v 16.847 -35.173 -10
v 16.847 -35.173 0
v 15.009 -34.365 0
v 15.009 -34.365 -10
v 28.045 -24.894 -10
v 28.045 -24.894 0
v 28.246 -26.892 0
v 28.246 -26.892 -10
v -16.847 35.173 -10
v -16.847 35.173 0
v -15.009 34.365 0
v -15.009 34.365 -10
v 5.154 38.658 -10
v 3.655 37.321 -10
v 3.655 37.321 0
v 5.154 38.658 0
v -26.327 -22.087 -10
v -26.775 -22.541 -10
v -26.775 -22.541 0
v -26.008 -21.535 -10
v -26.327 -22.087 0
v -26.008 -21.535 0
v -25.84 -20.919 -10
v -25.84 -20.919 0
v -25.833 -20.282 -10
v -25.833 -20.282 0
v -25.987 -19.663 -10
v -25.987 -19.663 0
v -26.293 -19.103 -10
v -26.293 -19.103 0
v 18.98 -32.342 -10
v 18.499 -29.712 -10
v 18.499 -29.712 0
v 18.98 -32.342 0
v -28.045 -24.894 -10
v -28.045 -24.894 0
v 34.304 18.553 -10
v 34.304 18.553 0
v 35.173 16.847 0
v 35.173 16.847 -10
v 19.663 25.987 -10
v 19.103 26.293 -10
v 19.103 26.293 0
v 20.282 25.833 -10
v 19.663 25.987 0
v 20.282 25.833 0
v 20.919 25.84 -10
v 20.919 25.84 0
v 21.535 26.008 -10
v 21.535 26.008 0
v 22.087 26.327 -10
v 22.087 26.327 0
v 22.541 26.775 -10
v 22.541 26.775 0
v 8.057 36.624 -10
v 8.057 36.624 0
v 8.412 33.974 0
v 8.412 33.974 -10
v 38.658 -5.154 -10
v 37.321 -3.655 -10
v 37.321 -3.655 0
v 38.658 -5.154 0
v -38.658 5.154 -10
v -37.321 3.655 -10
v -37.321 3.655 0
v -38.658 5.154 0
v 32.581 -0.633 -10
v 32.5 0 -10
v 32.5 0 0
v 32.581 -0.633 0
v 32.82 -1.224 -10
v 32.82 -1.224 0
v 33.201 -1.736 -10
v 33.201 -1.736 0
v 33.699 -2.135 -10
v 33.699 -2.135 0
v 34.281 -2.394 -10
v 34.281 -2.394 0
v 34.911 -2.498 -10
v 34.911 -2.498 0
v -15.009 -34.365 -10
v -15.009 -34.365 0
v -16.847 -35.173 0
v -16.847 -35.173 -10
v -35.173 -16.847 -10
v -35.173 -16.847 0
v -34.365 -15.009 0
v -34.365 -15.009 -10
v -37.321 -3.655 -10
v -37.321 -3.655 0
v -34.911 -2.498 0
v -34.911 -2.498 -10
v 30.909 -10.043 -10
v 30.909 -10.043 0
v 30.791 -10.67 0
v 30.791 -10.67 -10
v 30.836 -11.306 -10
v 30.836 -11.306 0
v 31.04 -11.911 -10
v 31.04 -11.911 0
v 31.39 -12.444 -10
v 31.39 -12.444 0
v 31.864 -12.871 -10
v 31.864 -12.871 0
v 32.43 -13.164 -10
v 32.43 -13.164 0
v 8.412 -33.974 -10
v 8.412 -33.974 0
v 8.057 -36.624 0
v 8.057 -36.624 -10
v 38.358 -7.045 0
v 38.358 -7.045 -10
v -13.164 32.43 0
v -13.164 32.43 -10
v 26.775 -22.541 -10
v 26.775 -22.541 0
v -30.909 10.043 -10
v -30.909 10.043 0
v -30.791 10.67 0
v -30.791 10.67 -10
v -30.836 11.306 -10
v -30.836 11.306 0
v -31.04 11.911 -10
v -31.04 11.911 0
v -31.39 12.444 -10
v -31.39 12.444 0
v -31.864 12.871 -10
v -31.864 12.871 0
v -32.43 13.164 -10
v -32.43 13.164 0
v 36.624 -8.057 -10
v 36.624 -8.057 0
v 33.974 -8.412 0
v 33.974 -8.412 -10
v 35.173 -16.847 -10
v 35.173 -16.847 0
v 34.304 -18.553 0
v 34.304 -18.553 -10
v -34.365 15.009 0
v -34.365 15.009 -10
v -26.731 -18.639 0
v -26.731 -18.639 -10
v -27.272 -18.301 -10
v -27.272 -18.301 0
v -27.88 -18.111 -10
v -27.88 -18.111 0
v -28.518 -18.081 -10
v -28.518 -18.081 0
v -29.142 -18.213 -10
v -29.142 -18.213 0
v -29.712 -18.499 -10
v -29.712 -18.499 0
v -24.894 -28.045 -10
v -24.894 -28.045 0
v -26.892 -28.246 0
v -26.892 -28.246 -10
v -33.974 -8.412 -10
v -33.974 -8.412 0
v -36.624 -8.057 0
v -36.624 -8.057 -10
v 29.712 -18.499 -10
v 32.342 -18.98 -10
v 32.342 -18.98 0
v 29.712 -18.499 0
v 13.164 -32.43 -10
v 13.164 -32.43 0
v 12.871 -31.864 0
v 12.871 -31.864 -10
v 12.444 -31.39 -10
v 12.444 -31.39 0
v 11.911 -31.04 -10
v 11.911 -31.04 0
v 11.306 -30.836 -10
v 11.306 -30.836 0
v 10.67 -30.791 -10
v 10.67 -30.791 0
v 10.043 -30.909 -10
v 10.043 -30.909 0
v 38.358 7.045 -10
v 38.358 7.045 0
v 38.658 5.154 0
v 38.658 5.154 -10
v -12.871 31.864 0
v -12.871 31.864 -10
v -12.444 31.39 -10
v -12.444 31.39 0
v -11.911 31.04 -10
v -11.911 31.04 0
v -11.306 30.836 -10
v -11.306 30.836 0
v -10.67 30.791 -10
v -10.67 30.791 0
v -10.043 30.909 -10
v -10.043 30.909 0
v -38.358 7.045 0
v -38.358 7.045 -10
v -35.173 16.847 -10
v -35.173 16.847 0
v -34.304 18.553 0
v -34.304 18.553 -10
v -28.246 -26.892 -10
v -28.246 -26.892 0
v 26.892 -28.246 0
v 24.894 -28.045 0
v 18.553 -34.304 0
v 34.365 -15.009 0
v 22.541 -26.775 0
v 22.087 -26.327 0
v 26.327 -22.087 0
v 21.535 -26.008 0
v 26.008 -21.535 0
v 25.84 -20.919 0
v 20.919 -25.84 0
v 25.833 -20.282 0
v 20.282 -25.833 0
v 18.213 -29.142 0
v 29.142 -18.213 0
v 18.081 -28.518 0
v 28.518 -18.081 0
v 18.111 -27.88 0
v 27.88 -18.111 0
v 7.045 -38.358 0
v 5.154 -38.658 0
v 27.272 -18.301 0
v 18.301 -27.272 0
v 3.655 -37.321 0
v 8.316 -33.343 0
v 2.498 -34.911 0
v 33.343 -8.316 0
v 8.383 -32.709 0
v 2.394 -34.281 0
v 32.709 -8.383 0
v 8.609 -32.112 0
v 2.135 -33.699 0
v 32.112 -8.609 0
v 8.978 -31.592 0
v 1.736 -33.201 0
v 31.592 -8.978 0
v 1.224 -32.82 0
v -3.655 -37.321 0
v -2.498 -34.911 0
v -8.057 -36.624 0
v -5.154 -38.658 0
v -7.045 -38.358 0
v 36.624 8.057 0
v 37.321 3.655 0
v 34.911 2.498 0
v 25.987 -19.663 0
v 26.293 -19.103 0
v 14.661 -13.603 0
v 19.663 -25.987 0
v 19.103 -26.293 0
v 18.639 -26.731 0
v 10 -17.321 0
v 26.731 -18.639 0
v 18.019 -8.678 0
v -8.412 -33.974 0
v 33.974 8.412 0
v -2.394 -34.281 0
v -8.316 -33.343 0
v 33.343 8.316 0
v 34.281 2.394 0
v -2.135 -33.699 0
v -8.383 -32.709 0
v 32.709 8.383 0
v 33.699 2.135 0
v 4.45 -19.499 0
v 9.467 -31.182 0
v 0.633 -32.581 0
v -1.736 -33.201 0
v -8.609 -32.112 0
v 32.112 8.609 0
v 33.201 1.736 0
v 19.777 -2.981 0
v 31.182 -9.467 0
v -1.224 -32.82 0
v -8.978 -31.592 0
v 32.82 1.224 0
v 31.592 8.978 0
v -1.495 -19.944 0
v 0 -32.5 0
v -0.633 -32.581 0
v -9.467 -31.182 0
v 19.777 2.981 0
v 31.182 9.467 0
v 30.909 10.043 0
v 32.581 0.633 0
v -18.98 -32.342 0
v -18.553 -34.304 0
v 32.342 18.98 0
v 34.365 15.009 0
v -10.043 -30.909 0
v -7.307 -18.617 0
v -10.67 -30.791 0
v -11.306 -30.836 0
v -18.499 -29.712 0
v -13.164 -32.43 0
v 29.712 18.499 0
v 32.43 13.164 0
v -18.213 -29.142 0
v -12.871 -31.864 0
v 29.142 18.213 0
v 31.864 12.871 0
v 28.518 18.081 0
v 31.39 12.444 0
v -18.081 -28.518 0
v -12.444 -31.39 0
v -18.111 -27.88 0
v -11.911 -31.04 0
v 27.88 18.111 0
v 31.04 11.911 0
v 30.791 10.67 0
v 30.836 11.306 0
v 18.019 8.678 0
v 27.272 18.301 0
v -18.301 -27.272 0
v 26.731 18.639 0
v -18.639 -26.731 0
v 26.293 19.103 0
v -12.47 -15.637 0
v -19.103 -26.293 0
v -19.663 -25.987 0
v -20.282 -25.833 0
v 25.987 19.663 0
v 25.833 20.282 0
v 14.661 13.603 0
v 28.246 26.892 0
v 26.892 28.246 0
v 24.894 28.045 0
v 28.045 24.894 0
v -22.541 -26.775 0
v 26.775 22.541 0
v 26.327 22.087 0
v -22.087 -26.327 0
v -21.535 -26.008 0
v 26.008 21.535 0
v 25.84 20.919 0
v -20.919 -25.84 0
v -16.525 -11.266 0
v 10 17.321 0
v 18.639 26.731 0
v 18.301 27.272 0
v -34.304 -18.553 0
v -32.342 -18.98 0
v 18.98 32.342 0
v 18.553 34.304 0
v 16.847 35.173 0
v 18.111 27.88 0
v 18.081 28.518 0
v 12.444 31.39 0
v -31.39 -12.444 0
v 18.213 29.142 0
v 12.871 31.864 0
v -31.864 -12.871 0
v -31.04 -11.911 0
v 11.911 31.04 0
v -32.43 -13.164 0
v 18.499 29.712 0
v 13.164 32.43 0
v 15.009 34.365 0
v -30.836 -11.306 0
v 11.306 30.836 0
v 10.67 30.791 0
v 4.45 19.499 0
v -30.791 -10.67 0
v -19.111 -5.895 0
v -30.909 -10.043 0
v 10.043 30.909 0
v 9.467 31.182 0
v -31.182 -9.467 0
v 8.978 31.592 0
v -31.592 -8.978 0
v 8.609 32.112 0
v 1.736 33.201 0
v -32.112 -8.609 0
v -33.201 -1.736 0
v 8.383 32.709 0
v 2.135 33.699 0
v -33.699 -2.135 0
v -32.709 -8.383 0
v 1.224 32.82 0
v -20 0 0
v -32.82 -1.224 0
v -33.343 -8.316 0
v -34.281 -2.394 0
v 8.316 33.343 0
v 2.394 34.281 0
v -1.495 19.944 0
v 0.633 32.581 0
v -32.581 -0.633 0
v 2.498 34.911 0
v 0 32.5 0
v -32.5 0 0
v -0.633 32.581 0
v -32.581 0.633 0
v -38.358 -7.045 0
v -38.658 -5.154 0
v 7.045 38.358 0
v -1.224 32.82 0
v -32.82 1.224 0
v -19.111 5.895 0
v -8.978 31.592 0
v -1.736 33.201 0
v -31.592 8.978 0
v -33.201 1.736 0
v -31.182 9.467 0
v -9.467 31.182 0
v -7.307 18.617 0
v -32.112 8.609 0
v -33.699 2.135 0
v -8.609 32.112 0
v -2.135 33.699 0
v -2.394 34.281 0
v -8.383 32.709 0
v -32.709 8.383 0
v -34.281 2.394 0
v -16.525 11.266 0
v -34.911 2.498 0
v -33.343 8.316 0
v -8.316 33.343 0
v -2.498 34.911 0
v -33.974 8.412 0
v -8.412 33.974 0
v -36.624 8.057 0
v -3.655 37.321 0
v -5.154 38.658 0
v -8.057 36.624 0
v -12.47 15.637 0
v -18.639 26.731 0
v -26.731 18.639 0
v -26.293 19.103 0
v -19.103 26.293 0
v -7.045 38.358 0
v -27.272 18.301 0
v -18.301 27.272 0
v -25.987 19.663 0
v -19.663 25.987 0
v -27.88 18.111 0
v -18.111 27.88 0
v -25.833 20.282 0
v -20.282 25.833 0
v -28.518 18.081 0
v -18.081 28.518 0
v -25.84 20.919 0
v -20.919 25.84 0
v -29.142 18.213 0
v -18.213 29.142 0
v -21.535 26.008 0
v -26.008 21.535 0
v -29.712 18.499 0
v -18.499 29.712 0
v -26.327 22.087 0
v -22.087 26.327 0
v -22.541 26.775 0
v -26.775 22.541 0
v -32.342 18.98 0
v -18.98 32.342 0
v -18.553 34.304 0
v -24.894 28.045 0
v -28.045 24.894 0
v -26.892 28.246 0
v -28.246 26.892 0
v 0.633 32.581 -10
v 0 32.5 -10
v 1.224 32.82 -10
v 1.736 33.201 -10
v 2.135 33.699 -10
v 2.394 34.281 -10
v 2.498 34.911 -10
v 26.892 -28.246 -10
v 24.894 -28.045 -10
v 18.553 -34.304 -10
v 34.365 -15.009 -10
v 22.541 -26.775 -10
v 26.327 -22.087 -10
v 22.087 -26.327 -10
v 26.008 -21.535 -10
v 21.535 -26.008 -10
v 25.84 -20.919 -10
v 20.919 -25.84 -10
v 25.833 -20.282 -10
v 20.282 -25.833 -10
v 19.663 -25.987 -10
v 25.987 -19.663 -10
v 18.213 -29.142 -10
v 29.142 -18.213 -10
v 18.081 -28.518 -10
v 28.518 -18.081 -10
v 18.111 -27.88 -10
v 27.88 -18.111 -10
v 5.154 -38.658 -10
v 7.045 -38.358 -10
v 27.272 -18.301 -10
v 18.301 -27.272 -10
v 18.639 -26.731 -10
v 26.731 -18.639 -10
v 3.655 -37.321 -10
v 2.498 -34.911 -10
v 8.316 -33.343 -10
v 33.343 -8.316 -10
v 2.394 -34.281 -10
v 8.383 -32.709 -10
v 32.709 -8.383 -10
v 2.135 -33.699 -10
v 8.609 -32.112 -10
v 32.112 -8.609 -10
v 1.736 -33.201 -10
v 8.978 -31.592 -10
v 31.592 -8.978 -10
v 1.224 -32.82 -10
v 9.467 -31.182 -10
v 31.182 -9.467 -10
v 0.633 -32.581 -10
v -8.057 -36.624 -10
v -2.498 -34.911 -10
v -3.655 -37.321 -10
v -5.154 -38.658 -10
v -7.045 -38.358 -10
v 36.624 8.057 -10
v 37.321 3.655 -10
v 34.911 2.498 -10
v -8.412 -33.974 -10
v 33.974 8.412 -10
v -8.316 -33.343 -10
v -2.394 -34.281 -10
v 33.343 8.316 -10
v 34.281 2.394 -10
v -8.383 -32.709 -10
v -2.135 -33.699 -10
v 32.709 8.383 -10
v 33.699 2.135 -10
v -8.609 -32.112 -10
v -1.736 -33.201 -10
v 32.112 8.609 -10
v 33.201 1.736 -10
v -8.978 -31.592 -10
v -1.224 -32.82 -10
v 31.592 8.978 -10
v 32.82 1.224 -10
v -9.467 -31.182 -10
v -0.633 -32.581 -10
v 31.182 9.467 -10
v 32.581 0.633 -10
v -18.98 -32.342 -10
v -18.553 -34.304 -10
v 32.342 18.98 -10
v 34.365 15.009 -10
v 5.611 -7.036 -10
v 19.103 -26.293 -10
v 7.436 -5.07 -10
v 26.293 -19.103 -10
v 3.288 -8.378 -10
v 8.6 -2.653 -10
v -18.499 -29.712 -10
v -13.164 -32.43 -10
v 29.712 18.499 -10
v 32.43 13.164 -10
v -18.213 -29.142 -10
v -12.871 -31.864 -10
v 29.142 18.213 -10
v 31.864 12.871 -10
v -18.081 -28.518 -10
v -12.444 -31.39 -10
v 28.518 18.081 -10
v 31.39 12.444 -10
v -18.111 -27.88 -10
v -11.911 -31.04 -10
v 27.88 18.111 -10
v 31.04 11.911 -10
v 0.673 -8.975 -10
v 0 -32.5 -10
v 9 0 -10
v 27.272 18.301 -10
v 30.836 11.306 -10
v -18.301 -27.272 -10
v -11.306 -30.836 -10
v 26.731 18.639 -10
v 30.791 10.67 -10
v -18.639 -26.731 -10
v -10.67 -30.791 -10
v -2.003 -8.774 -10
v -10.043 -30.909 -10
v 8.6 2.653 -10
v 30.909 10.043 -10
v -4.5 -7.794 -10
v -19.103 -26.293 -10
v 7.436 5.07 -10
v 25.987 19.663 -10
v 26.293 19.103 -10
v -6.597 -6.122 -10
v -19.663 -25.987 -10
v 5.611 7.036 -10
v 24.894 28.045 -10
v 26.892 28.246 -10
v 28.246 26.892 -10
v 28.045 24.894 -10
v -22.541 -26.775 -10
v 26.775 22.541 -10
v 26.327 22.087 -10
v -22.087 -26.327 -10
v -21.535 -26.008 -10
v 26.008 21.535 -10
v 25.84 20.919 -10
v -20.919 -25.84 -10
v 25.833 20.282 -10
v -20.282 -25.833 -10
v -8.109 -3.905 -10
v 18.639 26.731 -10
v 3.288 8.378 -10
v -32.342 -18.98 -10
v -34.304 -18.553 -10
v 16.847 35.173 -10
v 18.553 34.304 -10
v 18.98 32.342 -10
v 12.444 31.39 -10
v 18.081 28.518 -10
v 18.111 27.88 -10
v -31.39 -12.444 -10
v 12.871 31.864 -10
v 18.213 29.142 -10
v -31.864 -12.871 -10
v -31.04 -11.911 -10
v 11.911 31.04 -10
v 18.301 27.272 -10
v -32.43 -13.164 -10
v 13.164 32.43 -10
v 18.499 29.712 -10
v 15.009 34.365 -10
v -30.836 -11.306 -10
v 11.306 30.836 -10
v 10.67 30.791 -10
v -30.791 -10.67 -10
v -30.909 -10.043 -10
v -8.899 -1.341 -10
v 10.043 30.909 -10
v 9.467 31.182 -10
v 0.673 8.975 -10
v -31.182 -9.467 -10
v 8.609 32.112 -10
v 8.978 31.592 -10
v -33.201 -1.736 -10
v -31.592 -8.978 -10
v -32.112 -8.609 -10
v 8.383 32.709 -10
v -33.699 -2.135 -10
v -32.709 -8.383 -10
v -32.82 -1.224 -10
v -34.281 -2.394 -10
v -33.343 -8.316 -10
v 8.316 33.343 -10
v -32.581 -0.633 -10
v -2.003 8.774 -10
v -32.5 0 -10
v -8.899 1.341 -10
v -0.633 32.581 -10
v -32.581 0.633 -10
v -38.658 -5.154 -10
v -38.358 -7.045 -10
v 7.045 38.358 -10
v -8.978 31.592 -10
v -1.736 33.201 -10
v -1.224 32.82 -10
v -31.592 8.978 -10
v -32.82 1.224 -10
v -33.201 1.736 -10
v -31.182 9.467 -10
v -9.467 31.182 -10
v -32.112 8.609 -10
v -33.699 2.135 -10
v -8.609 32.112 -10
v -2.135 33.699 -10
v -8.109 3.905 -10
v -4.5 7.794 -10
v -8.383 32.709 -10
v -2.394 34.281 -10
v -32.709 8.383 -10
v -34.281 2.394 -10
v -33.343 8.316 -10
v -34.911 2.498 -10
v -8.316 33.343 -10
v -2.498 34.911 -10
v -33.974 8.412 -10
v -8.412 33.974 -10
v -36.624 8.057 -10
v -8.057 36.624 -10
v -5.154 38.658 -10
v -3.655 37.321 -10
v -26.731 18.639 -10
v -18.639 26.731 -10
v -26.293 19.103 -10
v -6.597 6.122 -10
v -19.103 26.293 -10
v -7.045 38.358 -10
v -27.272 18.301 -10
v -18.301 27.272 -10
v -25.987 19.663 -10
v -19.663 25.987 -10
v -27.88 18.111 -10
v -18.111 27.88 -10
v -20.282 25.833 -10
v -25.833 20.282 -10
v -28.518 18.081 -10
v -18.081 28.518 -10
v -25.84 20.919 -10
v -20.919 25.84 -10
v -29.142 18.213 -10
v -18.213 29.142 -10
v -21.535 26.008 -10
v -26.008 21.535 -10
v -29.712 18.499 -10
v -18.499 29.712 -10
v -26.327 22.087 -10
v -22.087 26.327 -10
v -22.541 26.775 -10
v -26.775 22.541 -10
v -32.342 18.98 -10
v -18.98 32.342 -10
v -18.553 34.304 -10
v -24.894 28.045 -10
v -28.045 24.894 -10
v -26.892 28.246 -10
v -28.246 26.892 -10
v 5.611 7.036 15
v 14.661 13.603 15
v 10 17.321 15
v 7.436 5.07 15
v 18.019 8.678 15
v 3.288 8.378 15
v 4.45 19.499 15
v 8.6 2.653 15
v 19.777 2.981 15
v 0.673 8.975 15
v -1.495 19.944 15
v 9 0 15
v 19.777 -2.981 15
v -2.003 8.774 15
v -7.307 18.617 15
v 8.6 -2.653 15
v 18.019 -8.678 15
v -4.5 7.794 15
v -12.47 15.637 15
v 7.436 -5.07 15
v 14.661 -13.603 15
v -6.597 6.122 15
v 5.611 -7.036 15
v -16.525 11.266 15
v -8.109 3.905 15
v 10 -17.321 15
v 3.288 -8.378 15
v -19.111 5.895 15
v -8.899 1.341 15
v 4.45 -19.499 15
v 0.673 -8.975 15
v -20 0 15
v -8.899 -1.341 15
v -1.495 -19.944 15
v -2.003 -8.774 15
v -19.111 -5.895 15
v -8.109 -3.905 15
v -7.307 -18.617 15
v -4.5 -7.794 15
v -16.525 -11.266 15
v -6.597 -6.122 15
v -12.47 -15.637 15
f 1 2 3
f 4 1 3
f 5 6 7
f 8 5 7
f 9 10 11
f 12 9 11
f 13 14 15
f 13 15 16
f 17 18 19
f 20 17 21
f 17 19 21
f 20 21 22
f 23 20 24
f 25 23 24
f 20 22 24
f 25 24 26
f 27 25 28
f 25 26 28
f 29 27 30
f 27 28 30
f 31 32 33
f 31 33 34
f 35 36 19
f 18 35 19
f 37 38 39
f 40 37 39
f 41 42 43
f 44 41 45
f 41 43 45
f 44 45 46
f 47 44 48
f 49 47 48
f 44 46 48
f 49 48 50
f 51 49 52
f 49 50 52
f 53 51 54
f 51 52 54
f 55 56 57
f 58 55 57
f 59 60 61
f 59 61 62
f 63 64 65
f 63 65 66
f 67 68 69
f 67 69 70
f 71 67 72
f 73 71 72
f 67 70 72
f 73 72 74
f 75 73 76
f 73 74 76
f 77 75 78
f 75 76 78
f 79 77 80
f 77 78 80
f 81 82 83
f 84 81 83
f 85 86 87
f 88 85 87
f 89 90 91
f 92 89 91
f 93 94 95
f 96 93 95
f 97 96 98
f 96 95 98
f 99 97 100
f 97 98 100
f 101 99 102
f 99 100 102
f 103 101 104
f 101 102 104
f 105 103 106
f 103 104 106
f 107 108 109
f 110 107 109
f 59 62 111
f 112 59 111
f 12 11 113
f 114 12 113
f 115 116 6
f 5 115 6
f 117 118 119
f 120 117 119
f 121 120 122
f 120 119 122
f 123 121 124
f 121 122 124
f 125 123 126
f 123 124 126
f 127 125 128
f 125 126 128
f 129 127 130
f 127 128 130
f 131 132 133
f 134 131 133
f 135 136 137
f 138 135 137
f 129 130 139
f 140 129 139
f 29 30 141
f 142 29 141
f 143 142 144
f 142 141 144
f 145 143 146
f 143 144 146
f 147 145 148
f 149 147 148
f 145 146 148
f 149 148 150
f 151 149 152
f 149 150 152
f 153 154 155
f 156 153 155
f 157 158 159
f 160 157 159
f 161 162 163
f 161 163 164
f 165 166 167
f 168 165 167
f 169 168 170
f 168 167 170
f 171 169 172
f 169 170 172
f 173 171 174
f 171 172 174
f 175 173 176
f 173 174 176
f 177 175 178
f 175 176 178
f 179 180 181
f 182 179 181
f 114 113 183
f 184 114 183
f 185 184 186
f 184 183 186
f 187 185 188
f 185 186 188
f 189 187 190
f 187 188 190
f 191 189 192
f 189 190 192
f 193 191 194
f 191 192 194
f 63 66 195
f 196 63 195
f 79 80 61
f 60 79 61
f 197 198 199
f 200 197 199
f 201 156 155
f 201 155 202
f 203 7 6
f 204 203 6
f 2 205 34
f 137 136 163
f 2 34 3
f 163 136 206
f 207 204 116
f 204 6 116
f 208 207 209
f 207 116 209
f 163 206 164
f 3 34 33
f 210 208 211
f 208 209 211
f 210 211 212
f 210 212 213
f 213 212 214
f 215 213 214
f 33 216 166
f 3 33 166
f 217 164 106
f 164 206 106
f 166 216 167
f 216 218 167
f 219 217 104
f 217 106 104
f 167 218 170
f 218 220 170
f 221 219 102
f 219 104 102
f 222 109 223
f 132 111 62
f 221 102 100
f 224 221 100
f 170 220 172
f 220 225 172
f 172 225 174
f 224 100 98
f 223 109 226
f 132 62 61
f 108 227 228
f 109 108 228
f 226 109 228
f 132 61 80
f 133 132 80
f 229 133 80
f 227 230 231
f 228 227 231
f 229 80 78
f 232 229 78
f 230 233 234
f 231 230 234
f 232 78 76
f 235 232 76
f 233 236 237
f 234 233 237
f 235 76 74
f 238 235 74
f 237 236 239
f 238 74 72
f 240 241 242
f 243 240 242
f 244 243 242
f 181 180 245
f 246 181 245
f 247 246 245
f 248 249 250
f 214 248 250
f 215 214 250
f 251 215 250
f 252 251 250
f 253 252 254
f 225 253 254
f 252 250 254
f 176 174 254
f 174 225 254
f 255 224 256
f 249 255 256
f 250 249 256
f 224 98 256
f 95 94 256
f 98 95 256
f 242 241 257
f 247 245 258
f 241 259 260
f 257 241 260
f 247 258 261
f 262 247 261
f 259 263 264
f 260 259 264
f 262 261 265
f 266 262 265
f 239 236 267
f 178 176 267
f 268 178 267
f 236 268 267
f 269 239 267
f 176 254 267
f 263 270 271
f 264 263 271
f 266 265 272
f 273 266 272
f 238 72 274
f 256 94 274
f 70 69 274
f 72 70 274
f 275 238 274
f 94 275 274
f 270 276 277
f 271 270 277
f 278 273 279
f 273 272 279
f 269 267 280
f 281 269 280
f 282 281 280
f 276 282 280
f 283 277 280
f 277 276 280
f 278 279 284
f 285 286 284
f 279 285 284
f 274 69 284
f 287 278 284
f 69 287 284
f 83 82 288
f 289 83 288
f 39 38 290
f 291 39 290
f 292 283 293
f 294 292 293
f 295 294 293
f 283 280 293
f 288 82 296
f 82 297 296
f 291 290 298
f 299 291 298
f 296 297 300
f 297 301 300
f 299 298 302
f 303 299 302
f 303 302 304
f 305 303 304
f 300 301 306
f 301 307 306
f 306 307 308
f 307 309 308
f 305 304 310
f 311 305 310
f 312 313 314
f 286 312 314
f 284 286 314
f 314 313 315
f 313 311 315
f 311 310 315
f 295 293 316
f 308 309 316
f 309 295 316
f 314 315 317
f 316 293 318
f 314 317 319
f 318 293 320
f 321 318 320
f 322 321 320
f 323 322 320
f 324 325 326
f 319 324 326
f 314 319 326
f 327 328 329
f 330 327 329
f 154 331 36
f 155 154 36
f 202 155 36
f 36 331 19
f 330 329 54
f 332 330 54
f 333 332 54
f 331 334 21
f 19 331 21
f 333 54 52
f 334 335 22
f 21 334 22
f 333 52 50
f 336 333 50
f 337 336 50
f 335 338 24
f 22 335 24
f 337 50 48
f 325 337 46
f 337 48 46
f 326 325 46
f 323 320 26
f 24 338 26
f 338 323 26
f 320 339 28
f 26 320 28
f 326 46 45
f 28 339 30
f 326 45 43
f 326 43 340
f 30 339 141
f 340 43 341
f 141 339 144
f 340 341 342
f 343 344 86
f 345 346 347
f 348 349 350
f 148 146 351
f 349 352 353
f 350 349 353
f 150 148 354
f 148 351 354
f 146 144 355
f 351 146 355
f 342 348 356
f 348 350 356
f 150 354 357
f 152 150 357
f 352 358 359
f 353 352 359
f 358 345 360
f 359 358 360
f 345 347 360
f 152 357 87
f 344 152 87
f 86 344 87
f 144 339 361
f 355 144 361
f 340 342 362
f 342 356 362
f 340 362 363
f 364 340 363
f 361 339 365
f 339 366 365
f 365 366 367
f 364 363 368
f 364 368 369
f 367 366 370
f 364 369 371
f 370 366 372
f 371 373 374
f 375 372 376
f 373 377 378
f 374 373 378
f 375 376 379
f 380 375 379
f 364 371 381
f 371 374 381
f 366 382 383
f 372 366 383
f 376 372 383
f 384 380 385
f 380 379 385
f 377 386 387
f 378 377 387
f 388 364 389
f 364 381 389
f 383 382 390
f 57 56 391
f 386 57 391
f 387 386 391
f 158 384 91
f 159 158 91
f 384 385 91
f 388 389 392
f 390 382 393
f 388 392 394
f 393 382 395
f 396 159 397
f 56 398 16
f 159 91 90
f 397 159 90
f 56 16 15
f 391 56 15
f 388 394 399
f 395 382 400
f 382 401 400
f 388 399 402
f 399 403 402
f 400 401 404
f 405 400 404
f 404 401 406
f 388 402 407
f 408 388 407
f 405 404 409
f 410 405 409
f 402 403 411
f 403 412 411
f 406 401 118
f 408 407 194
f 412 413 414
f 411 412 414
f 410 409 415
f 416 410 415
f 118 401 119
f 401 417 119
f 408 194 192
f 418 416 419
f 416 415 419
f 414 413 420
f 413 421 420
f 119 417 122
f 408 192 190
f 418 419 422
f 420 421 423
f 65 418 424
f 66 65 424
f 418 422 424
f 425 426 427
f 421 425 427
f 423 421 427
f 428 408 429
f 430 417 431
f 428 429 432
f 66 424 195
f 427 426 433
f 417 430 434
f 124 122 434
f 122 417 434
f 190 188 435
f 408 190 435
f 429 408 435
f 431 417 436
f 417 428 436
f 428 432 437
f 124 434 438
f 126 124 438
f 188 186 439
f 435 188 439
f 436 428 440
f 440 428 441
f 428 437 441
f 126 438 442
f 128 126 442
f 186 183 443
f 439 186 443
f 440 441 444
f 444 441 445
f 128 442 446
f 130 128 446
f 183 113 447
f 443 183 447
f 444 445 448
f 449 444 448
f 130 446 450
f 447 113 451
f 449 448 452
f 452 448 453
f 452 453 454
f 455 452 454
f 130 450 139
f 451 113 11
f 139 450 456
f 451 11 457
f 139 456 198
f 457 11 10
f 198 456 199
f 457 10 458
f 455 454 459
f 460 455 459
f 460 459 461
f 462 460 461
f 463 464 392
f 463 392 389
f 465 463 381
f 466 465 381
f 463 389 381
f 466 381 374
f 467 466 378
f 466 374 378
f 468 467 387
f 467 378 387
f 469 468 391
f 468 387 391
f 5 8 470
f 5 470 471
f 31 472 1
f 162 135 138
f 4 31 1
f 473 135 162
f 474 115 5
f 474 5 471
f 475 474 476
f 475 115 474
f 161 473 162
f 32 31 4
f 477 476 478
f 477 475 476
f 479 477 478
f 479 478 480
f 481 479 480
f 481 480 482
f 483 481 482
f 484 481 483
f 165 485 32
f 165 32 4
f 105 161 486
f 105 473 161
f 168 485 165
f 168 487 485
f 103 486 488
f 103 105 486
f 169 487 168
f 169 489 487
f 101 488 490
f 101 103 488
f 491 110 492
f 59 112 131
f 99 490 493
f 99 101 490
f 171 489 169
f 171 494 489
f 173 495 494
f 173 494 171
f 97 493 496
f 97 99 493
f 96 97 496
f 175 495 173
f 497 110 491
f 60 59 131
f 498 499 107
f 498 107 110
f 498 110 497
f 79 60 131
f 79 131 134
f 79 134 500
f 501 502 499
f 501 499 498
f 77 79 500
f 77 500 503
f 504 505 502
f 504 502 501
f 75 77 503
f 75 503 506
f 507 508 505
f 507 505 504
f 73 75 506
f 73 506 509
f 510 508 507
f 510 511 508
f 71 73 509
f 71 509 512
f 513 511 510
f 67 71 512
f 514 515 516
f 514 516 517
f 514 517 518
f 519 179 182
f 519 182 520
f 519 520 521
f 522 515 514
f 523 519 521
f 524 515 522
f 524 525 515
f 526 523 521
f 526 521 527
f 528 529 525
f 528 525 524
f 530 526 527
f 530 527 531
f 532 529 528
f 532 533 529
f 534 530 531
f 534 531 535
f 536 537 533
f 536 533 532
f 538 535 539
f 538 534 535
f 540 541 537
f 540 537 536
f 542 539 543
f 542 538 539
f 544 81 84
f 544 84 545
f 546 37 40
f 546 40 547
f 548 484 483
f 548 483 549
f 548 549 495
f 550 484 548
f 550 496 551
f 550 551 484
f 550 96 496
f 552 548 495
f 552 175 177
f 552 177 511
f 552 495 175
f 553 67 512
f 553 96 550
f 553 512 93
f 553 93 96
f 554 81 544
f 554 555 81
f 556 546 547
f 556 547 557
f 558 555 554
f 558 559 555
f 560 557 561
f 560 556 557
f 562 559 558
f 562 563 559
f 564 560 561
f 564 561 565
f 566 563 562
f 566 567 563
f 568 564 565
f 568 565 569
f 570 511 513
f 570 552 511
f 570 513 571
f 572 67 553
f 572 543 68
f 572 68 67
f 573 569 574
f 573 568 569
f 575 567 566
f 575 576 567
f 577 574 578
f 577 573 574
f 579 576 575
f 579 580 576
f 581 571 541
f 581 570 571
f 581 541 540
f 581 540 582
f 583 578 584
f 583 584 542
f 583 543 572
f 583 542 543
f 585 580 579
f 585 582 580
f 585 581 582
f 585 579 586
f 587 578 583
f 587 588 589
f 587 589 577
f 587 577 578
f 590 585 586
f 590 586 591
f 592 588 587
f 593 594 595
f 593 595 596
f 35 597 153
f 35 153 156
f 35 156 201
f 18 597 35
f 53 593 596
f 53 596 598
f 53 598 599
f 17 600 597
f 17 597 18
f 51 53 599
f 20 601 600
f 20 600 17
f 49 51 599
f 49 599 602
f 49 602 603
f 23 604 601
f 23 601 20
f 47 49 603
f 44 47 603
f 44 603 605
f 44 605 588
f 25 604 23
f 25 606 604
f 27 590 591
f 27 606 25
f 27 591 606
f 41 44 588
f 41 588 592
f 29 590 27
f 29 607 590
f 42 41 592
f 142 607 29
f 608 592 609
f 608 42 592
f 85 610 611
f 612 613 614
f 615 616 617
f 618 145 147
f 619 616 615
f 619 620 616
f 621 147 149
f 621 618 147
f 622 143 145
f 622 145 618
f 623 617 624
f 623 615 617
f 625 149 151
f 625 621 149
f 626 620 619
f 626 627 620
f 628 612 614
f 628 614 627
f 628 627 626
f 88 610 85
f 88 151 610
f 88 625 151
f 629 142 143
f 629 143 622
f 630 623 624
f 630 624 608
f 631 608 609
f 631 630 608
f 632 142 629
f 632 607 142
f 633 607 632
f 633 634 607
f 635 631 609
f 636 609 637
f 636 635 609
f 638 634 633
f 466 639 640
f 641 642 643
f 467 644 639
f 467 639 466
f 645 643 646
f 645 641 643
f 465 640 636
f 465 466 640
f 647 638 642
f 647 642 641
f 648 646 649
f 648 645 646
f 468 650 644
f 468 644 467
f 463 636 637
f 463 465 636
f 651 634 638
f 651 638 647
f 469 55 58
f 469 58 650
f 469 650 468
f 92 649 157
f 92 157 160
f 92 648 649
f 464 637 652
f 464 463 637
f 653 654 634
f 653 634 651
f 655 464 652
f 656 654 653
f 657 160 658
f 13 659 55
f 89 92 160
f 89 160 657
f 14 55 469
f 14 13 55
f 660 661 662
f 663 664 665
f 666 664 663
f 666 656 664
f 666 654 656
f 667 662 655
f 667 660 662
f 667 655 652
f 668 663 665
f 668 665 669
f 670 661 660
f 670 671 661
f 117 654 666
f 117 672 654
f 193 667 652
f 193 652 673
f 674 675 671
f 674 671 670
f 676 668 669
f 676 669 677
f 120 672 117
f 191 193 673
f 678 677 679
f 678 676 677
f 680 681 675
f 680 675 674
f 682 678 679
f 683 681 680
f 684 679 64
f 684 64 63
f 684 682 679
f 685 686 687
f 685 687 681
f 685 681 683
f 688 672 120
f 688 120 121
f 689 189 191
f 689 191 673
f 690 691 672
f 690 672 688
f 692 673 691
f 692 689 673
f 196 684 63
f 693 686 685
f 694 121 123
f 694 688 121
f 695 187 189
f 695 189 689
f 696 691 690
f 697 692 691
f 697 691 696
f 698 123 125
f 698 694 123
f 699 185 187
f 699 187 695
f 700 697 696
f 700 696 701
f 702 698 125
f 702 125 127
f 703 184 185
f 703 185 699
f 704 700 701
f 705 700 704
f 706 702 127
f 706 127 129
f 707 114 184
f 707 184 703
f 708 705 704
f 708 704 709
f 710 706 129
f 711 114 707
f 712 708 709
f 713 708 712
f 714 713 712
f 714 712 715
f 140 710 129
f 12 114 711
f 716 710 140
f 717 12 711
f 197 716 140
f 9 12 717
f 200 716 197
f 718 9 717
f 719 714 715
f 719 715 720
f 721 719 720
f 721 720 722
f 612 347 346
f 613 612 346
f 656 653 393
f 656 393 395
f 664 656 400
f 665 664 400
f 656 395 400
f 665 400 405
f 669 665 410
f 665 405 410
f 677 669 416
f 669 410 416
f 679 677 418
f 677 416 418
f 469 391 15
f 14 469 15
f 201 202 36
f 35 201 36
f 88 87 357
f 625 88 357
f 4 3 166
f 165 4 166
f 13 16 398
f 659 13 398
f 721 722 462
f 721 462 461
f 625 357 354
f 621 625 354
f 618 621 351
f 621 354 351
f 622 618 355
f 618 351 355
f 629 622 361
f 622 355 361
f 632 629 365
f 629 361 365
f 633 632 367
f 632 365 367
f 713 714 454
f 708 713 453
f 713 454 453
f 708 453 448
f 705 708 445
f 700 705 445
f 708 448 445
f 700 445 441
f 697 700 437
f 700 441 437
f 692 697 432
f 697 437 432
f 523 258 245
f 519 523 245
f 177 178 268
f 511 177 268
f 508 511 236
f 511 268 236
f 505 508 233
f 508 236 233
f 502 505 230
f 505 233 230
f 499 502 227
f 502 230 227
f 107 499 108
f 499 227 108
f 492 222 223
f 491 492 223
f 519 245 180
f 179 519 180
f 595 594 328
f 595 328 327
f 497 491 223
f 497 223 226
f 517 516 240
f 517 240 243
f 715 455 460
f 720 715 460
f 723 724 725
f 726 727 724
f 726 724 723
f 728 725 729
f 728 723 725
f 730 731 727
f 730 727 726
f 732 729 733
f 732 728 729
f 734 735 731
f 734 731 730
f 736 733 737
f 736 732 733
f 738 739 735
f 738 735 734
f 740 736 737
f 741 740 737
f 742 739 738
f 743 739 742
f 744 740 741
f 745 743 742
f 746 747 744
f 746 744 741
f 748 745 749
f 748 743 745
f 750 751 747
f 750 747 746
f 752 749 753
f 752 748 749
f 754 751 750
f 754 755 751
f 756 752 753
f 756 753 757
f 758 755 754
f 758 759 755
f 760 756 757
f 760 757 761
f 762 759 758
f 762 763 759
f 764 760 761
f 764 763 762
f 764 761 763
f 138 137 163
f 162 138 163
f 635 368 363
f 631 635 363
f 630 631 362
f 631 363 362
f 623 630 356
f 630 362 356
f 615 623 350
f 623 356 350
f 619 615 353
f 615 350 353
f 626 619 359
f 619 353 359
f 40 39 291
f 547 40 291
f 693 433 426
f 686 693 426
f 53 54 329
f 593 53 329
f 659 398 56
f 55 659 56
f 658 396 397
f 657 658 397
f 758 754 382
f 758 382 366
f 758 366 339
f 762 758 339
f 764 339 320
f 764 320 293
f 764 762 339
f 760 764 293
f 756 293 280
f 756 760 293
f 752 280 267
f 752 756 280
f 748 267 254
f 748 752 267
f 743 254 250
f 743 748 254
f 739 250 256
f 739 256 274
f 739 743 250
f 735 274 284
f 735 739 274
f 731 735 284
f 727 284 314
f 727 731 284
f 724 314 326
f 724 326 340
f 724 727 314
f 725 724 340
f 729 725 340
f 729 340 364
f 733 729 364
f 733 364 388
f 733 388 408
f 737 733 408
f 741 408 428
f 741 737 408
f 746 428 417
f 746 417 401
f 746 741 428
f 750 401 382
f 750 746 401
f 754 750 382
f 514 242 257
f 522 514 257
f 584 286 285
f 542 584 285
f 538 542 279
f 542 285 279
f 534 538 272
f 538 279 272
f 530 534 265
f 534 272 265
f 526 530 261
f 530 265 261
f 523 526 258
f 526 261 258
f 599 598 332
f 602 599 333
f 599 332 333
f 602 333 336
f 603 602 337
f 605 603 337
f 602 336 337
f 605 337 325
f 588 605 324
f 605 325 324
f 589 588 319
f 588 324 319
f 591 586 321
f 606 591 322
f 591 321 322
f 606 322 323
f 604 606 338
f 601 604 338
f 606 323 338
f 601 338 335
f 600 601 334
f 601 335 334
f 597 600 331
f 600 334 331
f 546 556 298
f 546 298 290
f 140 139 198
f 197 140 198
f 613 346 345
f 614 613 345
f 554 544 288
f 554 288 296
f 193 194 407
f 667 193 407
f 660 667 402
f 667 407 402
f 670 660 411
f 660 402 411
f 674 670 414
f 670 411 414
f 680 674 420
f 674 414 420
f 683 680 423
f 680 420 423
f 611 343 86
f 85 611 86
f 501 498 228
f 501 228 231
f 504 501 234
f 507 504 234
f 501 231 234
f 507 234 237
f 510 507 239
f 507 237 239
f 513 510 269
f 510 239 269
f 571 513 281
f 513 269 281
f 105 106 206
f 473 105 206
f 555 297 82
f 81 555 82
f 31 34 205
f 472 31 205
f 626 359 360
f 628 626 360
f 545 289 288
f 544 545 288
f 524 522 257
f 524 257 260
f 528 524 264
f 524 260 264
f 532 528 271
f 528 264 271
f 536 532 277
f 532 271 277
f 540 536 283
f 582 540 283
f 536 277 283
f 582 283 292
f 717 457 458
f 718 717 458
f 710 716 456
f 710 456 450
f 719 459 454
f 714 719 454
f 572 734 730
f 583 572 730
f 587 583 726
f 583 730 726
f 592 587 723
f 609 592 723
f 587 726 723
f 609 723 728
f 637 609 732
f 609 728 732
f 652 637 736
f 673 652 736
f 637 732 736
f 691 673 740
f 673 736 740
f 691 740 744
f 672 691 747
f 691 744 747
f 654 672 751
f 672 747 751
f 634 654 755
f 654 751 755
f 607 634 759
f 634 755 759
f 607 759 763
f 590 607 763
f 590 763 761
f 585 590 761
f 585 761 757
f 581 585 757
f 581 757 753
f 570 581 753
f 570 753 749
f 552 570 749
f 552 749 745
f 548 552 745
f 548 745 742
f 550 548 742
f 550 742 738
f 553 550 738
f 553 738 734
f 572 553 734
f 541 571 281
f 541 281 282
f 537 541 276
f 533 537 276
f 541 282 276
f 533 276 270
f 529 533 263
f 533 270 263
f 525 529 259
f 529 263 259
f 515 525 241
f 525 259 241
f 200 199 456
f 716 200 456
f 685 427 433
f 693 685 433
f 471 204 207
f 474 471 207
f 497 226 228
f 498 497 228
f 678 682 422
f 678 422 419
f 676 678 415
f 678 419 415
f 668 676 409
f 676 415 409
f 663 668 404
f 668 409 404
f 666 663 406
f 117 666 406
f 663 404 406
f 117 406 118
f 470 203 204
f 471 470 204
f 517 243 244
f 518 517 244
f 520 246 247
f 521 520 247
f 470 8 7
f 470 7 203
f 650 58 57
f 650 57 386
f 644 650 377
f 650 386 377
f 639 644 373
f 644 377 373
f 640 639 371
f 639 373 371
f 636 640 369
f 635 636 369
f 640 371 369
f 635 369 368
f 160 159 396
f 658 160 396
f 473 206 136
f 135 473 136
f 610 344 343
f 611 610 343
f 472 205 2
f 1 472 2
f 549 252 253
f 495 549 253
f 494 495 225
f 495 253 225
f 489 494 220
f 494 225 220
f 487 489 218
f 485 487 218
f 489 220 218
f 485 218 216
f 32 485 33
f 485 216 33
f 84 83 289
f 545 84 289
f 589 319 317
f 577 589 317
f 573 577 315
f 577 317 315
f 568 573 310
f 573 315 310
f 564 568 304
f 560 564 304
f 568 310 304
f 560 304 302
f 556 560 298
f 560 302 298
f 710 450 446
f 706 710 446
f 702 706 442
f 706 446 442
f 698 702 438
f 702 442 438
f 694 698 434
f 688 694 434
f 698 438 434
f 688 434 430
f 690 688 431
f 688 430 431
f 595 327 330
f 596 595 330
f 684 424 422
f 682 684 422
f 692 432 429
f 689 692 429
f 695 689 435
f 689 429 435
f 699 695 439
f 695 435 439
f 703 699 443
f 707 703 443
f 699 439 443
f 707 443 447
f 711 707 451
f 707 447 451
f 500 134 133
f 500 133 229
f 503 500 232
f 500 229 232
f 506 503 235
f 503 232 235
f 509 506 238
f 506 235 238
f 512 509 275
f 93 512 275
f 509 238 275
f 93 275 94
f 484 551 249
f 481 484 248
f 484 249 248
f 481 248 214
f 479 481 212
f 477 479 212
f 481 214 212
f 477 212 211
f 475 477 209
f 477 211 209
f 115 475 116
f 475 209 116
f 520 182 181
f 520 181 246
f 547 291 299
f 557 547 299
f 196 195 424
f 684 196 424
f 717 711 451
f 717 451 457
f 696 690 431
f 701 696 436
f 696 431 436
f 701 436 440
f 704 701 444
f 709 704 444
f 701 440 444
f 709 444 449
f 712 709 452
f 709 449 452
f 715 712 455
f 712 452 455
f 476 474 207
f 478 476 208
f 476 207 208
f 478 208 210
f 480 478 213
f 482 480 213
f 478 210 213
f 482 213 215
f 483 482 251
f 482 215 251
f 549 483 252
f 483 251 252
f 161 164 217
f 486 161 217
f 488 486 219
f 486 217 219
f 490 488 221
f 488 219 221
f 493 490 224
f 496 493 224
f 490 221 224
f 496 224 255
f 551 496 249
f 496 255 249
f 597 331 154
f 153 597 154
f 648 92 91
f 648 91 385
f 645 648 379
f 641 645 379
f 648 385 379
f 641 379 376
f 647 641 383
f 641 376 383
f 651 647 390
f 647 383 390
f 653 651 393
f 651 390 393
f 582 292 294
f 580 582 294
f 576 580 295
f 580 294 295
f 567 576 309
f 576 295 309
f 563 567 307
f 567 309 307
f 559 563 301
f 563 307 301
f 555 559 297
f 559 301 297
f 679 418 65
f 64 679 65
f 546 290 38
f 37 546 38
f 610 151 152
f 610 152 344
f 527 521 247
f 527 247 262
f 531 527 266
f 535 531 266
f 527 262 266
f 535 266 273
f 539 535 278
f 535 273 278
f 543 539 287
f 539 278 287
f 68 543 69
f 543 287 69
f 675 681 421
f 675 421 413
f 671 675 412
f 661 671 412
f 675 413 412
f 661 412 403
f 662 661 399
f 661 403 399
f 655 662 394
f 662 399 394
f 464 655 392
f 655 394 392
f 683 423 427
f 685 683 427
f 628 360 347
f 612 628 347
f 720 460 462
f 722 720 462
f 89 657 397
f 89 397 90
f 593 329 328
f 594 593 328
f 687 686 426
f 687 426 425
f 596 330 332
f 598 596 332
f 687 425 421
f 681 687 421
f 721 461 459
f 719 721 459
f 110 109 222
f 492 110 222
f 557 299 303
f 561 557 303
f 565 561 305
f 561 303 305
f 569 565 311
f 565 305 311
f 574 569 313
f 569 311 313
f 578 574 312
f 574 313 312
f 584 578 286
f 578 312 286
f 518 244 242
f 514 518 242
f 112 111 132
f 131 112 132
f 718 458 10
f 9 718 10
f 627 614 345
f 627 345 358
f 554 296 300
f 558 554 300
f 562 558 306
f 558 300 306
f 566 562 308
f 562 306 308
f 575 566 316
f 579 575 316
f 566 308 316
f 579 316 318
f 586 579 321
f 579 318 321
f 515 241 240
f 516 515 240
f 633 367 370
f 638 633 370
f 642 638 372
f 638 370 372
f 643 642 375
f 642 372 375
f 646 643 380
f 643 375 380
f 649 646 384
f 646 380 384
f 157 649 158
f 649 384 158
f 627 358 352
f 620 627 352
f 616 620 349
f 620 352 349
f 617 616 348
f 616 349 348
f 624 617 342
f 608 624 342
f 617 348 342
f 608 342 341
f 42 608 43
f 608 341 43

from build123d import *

# Parameters (mm, degrees)
SKETCH_4_R      = 9
EXTRUDE_3_DEPTH = 10
EXTRUDE_START   = 15
SKETCH_6_R      = 20
SKETCH_6_R_2    = 9
EXTRUDE_4_DEPTH = 15


with BuildPart() as part:
    # 草圖4 → 填料-伸長3 (new body)
    with BuildSketch(Plane.XY):
        with BuildLine():
            Line((2.498405104, 34.910714286), (3.655076706, 37.321447108))
            Line((3.655076706, 37.321447108), (5.153563847, 38.657997616))
            Line((5.153563847, 38.657997616), (7.044647753, 38.35847935))
            Line((7.044647753, 38.35847935), (8.056776892, 36.624286288))
            Line((8.056776892, 36.624286288), (8.411879546, 33.974111946))
            ThreePointArc((8.411879546, 33.974111946), (8.608704453, 32.11239943), (10.043052317, 30.90933678))
            ThreePointArc((10.043052317, 30.90933678), (11.910606599, 31.039546388), (13.164128454, 32.430012674))
            Line((13.164128454, 32.430012674), (15.00914593, 34.365324652))
            Line((15.00914593, 34.365324652), (16.84730871, 35.173401729))
            Line((16.84730871, 35.173401729), (18.553280148, 34.304165866))
            Line((18.553280148, 34.304165866), (18.979977034, 32.342085149))
            Line((18.979977034, 32.342085149), (18.498750817, 29.711886817))
            ThreePointArc((18.498750817, 29.711886817), (18.110641621, 27.880470756), (19.1030207, 26.293052317))
            ThreePointArc((19.1030207, 26.293052317), (20.91940735, 25.839783003), (22.541255192, 26.774835469))
            Line((22.541255192, 26.774835469), (24.894015376, 28.045284782))
            Line((24.894015376, 28.045284782), (26.891921615, 28.245788214))
            Line((26.891921615, 28.245788214), (28.245788214, 26.891921615))
            Line((28.245788214, 26.891921615), (28.045284782, 24.894015376))
            Line((28.045284782, 24.894015376), (26.774835469, 22.541255192))
            ThreePointArc((26.774835469, 22.541255192), (25.839783003, 20.91940735), (26.293052317, 19.1030207))
            ThreePointArc((26.293052317, 19.1030207), (27.880470756, 18.110641621), (29.711886817, 18.498750817))
            Line((29.711886817, 18.498750817), (32.342085149, 18.979977034))
            Line((32.342085149, 18.979977034), (34.304165866, 18.553280148))
            Line((34.304165866, 18.553280148), (35.173401729, 16.84730871))
            Line((35.173401729, 16.84730871), (34.365324652, 15.00914593))
            Line((34.365324652, 15.00914593), (32.430012674, 13.164128454))
            ThreePointArc((32.430012674, 13.164128454), (31.039546388, 11.910606599), (30.90933678, 10.043052317))
            ThreePointArc((30.90933678, 10.043052317), (32.11239943, 8.608704453), (33.974111946, 8.411879546))
            Line((33.974111946, 8.411879546), (36.624286288, 8.056776892))
            Line((36.624286288, 8.056776892), (38.35847935, 7.044647753))
            Line((38.35847935, 7.044647753), (38.657997616, 5.153563847))
            Line((38.657997616, 5.153563847), (37.321447108, 3.655076706))
            Line((37.321447108, 3.655076706), (34.910714286, 2.498405104))
            ThreePointArc((34.910714286, 2.498405104), (33.200942707, 1.735912687), (32.5, 0))
            ThreePointArc((32.5, 0), (33.200942707, -1.735912687), (34.910714286, -2.498405104))
            Line((34.910714286, -2.498405104), (37.321447108, -3.655076706))
            Line((37.321447108, -3.655076706), (38.657997616, -5.153563847))
            Line((38.657997616, -5.153563847), (38.35847935, -7.044647753))
            Line((38.35847935, -7.044647753), (36.624286288, -8.056776892))
            Line((36.624286288, -8.056776892), (33.974111946, -8.411879546))
            ThreePointArc((33.974111946, -8.411879546), (32.11239943, -8.608704453), (30.90933678, -10.043052317))
            ThreePointArc((30.90933678, -10.043052317), (31.039546388, -11.910606599), (32.430012674, -13.164128454))
            Line((32.430012674, -13.164128454), (34.365324652, -15.00914593))
            Line((34.365324652, -15.00914593), (35.173401729, -16.84730871))
            Line((35.173401729, -16.84730871), (34.304165866, -18.553280148))
            Line((34.304165866, -18.553280148), (32.342085149, -18.979977034))
            Line((32.342085149, -18.979977034), (29.711886817, -18.498750817))
            ThreePointArc((29.711886817, -18.498750817), (27.880470756, -18.110641621), (26.293052317, -19.1030207))
            ThreePointArc((26.293052317, -19.1030207), (25.839783003, -20.91940735), (26.774835469, -22.541255192))
            Line((26.774835469, -22.541255192), (28.045284782, -24.894015376))
            Line((28.045284782, -24.894015376), (28.245788214, -26.891921615))
            Line((28.245788214, -26.891921615), (26.891921615, -28.245788214))
            Line((26.891921615, -28.245788214), (24.894015376, -28.045284782))
            Line((24.894015376, -28.045284782), (22.541255192, -26.774835469))
            ThreePointArc((22.541255192, -26.774835469), (20.91940735, -25.839783003), (19.1030207, -26.293052317))
            ThreePointArc((19.1030207, -26.293052317), (18.110641621, -27.880470756), (18.498750817, -29.711886817))
            Line((18.498750817, -29.711886817), (18.979977034, -32.342085149))
            Line((18.979977034, -32.342085149), (18.553280148, -34.304165866))
            Line((18.553280148, -34.304165866), (16.84730871, -35.173401729))
            Line((16.84730871, -35.173401729), (15.00914593, -34.365324652))
            Line((15.00914593, -34.365324652), (13.164128454, -32.430012674))
            ThreePointArc((13.164128454, -32.430012674), (11.910606599, -31.039546388), (10.043052317, -30.90933678))
            ThreePointArc((10.043052317, -30.90933678), (8.608704453, -32.11239943), (8.411879546, -33.974111946))
            Line((8.411879546, -33.974111946), (8.056776892, -36.624286288))
            Line((8.056776892, -36.624286288), (7.044647753, -38.35847935))
            Line((7.044647753, -38.35847935), (5.153563847, -38.657997616))
            Line((5.153563847, -38.657997616), (3.655076706, -37.321447108))
            Line((3.655076706, -37.321447108), (2.498405104, -34.910714286))
            ThreePointArc((2.498405104, -34.910714286), (1.735912687, -33.200942707), (0, -32.5))
            ThreePointArc((0, -32.5), (-1.735912687, -33.200942707), (-2.498405104, -34.910714286))
            Line((-2.498405104, -34.910714286), (-3.655076706, -37.321447108))
            Line((-3.655076706, -37.321447108), (-5.153563847, -38.657997616))
            Line((-5.153563847, -38.657997616), (-7.044647753, -38.35847935))
            Line((-7.044647753, -38.35847935), (-8.056776892, -36.624286288))
            Line((-8.056776892, -36.624286288), (-8.411879546, -33.974111946))
            ThreePointArc((-8.411879546, -33.974111946), (-8.608704453, -32.11239943), (-10.043052317, -30.90933678))
            ThreePointArc((-10.043052317, -30.90933678), (-11.910606599, -31.039546388), (-13.164128454, -32.430012674))
            Line((-13.164128454, -32.430012674), (-15.00914593, -34.365324652))
            Line((-15.00914593, -34.365324652), (-16.84730871, -35.173401729))
            Line((-16.84730871, -35.173401729), (-18.553280148, -34.304165866))
            Line((-18.553280148, -34.304165866), (-18.979977034, -32.342085149))
            Line((-18.979977034, -32.342085149), (-18.498750817, -29.711886817))
            ThreePointArc((-18.498750817, -29.711886817), (-18.110641621, -27.880470756), (-19.1030207, -26.293052317))
            ThreePointArc((-19.1030207, -26.293052317), (-20.91940735, -25.839783003), (-22.541255192, -26.774835469))
            Line((-22.541255192, -26.774835469), (-24.894015376, -28.045284782))
            Line((-24.894015376, -28.045284782), (-26.891921615, -28.245788214))
            Line((-26.891921615, -28.245788214), (-28.245788214, -26.891921615))
            Line((-28.245788214, -26.891921615), (-28.045284782, -24.894015376))
            Line((-28.045284782, -24.894015376), (-26.774835469, -22.541255192))
            ThreePointArc((-26.774835469, -22.541255192), (-25.839783003, -20.91940735), (-26.293052317, -19.1030207))
            ThreePointArc((-26.293052317, -19.1030207), (-27.880470756, -18.110641621), (-29.711886817, -18.498750817))
            Line((-29.711886817, -18.498750817), (-32.342085149, -18.979977034))
            Line((-32.342085149, -18.979977034), (-34.304165866, -18.553280148))
            Line((-34.304165866, -18.553280148), (-35.173401729, -16.84730871))
            Line((-35.173401729, -16.84730871), (-34.365324652, -15.00914593))
            Line((-34.365324652, -15.00914593), (-32.430012674, -13.164128454))
            ThreePointArc((-32.430012674, -13.164128454), (-31.039546388, -11.910606599), (-30.90933678, -10.043052317))
            ThreePointArc((-30.90933678, -10.043052317), (-32.11239943, -8.608704453), (-33.974111946, -8.411879546))
            Line((-33.974111946, -8.411879546), (-36.624286288, -8.056776892))
            Line((-36.624286288, -8.056776892), (-38.35847935, -7.044647753))
            Line((-38.35847935, -7.044647753), (-38.657997616, -5.153563847))
            Line((-38.657997616, -5.153563847), (-37.321447108, -3.655076706))
            Line((-37.321447108, -3.655076706), (-34.910714286, -2.498405104))
            ThreePointArc((-34.910714286, -2.498405104), (-33.200942707, -1.735912687), (-32.5, 0))
            ThreePointArc((-32.5, 0), (-33.200942707, 1.735912687), (-34.910714286, 2.498405104))
            Line((-34.910714286, 2.498405104), (-37.321447108, 3.655076706))
            Line((-37.321447108, 3.655076706), (-38.657997616, 5.153563847))
            Line((-38.657997616, 5.153563847), (-38.35847935, 7.044647753))
            Line((-38.35847935, 7.044647753), (-36.624286288, 8.056776892))
            Line((-36.624286288, 8.056776892), (-33.974111946, 8.411879546))
            ThreePointArc((-33.974111946, 8.411879546), (-32.11239943, 8.608704453), (-30.90933678, 10.043052317))
            ThreePointArc((-30.90933678, 10.043052317), (-31.039546388, 11.910606599), (-32.430012674, 13.164128454))
            Line((-32.430012674, 13.164128454), (-34.365324652, 15.00914593))
            Line((-34.365324652, 15.00914593), (-35.173401729, 16.84730871))
            Line((-35.173401729, 16.84730871), (-34.304165866, 18.553280148))
            Line((-34.304165866, 18.553280148), (-32.342085149, 18.979977034))
            Line((-32.342085149, 18.979977034), (-29.711886817, 18.498750817))
            ThreePointArc((-29.711886817, 18.498750817), (-27.880470756, 18.110641621), (-26.293052317, 19.1030207))
            ThreePointArc((-26.293052317, 19.1030207), (-25.839783003, 20.91940735), (-26.774835469, 22.541255192))
            Line((-26.774835469, 22.541255192), (-28.045284782, 24.894015376))
            Line((-28.045284782, 24.894015376), (-28.245788214, 26.891921615))
            Line((-28.245788214, 26.891921615), (-26.891921615, 28.245788214))
            Line((-26.891921615, 28.245788214), (-24.894015376, 28.045284782))
            Line((-24.894015376, 28.045284782), (-22.541255192, 26.774835469))
            ThreePointArc((-22.541255192, 26.774835469), (-20.91940735, 25.839783003), (-19.1030207, 26.293052317))
            ThreePointArc((-19.1030207, 26.293052317), (-18.110641621, 27.880470756), (-18.498750817, 29.711886817))
            Line((-18.498750817, 29.711886817), (-18.979977034, 32.342085149))
            Line((-18.979977034, 32.342085149), (-18.553280148, 34.304165866))
            Line((-18.553280148, 34.304165866), (-16.84730871, 35.173401729))
            Line((-16.84730871, 35.173401729), (-15.00914593, 34.365324652))
            Line((-15.00914593, 34.365324652), (-13.164128454, 32.430012674))
            ThreePointArc((-13.164128454, 32.430012674), (-11.910606599, 31.039546388), (-10.043052317, 30.90933678))
            ThreePointArc((-10.043052317, 30.90933678), (-8.608704453, 32.11239943), (-8.411879546, 33.974111946))
            Line((-8.411879546, 33.974111946), (-8.056776892, 36.624286288))
            Line((-8.056776892, 36.624286288), (-7.044647753, 38.35847935))
            Line((-7.044647753, 38.35847935), (-5.153563847, 38.657997616))
            Line((-5.153563847, 38.657997616), (-3.655076706, 37.321447108))
            Line((-3.655076706, 37.321447108), (-2.498405104, 34.910714286))
            ThreePointArc((-2.498405104, 34.910714286), (-1.735912687, 33.200942707), (0, 32.5))
            ThreePointArc((0, 32.5), (1.735912687, 33.200942707), (2.498405104, 34.910714286))
        make_face()
        Circle(SKETCH_4_R, mode=Mode.SUBTRACT)
    extrude(amount=-EXTRUDE_3_DEPTH)

    # 草圖6 → 填料-伸長4 (add)
    with BuildSketch(Plane.XY.offset(EXTRUDE_START)):
        with Locations(Location((0, 0, 0), (0, 0, 180))):
            Circle(SKETCH_6_R)
        Circle(SKETCH_6_R_2, mode=Mode.SUBTRACT)
    extrude(amount=-EXTRUDE_4_DEPTH)


solid = part.part
